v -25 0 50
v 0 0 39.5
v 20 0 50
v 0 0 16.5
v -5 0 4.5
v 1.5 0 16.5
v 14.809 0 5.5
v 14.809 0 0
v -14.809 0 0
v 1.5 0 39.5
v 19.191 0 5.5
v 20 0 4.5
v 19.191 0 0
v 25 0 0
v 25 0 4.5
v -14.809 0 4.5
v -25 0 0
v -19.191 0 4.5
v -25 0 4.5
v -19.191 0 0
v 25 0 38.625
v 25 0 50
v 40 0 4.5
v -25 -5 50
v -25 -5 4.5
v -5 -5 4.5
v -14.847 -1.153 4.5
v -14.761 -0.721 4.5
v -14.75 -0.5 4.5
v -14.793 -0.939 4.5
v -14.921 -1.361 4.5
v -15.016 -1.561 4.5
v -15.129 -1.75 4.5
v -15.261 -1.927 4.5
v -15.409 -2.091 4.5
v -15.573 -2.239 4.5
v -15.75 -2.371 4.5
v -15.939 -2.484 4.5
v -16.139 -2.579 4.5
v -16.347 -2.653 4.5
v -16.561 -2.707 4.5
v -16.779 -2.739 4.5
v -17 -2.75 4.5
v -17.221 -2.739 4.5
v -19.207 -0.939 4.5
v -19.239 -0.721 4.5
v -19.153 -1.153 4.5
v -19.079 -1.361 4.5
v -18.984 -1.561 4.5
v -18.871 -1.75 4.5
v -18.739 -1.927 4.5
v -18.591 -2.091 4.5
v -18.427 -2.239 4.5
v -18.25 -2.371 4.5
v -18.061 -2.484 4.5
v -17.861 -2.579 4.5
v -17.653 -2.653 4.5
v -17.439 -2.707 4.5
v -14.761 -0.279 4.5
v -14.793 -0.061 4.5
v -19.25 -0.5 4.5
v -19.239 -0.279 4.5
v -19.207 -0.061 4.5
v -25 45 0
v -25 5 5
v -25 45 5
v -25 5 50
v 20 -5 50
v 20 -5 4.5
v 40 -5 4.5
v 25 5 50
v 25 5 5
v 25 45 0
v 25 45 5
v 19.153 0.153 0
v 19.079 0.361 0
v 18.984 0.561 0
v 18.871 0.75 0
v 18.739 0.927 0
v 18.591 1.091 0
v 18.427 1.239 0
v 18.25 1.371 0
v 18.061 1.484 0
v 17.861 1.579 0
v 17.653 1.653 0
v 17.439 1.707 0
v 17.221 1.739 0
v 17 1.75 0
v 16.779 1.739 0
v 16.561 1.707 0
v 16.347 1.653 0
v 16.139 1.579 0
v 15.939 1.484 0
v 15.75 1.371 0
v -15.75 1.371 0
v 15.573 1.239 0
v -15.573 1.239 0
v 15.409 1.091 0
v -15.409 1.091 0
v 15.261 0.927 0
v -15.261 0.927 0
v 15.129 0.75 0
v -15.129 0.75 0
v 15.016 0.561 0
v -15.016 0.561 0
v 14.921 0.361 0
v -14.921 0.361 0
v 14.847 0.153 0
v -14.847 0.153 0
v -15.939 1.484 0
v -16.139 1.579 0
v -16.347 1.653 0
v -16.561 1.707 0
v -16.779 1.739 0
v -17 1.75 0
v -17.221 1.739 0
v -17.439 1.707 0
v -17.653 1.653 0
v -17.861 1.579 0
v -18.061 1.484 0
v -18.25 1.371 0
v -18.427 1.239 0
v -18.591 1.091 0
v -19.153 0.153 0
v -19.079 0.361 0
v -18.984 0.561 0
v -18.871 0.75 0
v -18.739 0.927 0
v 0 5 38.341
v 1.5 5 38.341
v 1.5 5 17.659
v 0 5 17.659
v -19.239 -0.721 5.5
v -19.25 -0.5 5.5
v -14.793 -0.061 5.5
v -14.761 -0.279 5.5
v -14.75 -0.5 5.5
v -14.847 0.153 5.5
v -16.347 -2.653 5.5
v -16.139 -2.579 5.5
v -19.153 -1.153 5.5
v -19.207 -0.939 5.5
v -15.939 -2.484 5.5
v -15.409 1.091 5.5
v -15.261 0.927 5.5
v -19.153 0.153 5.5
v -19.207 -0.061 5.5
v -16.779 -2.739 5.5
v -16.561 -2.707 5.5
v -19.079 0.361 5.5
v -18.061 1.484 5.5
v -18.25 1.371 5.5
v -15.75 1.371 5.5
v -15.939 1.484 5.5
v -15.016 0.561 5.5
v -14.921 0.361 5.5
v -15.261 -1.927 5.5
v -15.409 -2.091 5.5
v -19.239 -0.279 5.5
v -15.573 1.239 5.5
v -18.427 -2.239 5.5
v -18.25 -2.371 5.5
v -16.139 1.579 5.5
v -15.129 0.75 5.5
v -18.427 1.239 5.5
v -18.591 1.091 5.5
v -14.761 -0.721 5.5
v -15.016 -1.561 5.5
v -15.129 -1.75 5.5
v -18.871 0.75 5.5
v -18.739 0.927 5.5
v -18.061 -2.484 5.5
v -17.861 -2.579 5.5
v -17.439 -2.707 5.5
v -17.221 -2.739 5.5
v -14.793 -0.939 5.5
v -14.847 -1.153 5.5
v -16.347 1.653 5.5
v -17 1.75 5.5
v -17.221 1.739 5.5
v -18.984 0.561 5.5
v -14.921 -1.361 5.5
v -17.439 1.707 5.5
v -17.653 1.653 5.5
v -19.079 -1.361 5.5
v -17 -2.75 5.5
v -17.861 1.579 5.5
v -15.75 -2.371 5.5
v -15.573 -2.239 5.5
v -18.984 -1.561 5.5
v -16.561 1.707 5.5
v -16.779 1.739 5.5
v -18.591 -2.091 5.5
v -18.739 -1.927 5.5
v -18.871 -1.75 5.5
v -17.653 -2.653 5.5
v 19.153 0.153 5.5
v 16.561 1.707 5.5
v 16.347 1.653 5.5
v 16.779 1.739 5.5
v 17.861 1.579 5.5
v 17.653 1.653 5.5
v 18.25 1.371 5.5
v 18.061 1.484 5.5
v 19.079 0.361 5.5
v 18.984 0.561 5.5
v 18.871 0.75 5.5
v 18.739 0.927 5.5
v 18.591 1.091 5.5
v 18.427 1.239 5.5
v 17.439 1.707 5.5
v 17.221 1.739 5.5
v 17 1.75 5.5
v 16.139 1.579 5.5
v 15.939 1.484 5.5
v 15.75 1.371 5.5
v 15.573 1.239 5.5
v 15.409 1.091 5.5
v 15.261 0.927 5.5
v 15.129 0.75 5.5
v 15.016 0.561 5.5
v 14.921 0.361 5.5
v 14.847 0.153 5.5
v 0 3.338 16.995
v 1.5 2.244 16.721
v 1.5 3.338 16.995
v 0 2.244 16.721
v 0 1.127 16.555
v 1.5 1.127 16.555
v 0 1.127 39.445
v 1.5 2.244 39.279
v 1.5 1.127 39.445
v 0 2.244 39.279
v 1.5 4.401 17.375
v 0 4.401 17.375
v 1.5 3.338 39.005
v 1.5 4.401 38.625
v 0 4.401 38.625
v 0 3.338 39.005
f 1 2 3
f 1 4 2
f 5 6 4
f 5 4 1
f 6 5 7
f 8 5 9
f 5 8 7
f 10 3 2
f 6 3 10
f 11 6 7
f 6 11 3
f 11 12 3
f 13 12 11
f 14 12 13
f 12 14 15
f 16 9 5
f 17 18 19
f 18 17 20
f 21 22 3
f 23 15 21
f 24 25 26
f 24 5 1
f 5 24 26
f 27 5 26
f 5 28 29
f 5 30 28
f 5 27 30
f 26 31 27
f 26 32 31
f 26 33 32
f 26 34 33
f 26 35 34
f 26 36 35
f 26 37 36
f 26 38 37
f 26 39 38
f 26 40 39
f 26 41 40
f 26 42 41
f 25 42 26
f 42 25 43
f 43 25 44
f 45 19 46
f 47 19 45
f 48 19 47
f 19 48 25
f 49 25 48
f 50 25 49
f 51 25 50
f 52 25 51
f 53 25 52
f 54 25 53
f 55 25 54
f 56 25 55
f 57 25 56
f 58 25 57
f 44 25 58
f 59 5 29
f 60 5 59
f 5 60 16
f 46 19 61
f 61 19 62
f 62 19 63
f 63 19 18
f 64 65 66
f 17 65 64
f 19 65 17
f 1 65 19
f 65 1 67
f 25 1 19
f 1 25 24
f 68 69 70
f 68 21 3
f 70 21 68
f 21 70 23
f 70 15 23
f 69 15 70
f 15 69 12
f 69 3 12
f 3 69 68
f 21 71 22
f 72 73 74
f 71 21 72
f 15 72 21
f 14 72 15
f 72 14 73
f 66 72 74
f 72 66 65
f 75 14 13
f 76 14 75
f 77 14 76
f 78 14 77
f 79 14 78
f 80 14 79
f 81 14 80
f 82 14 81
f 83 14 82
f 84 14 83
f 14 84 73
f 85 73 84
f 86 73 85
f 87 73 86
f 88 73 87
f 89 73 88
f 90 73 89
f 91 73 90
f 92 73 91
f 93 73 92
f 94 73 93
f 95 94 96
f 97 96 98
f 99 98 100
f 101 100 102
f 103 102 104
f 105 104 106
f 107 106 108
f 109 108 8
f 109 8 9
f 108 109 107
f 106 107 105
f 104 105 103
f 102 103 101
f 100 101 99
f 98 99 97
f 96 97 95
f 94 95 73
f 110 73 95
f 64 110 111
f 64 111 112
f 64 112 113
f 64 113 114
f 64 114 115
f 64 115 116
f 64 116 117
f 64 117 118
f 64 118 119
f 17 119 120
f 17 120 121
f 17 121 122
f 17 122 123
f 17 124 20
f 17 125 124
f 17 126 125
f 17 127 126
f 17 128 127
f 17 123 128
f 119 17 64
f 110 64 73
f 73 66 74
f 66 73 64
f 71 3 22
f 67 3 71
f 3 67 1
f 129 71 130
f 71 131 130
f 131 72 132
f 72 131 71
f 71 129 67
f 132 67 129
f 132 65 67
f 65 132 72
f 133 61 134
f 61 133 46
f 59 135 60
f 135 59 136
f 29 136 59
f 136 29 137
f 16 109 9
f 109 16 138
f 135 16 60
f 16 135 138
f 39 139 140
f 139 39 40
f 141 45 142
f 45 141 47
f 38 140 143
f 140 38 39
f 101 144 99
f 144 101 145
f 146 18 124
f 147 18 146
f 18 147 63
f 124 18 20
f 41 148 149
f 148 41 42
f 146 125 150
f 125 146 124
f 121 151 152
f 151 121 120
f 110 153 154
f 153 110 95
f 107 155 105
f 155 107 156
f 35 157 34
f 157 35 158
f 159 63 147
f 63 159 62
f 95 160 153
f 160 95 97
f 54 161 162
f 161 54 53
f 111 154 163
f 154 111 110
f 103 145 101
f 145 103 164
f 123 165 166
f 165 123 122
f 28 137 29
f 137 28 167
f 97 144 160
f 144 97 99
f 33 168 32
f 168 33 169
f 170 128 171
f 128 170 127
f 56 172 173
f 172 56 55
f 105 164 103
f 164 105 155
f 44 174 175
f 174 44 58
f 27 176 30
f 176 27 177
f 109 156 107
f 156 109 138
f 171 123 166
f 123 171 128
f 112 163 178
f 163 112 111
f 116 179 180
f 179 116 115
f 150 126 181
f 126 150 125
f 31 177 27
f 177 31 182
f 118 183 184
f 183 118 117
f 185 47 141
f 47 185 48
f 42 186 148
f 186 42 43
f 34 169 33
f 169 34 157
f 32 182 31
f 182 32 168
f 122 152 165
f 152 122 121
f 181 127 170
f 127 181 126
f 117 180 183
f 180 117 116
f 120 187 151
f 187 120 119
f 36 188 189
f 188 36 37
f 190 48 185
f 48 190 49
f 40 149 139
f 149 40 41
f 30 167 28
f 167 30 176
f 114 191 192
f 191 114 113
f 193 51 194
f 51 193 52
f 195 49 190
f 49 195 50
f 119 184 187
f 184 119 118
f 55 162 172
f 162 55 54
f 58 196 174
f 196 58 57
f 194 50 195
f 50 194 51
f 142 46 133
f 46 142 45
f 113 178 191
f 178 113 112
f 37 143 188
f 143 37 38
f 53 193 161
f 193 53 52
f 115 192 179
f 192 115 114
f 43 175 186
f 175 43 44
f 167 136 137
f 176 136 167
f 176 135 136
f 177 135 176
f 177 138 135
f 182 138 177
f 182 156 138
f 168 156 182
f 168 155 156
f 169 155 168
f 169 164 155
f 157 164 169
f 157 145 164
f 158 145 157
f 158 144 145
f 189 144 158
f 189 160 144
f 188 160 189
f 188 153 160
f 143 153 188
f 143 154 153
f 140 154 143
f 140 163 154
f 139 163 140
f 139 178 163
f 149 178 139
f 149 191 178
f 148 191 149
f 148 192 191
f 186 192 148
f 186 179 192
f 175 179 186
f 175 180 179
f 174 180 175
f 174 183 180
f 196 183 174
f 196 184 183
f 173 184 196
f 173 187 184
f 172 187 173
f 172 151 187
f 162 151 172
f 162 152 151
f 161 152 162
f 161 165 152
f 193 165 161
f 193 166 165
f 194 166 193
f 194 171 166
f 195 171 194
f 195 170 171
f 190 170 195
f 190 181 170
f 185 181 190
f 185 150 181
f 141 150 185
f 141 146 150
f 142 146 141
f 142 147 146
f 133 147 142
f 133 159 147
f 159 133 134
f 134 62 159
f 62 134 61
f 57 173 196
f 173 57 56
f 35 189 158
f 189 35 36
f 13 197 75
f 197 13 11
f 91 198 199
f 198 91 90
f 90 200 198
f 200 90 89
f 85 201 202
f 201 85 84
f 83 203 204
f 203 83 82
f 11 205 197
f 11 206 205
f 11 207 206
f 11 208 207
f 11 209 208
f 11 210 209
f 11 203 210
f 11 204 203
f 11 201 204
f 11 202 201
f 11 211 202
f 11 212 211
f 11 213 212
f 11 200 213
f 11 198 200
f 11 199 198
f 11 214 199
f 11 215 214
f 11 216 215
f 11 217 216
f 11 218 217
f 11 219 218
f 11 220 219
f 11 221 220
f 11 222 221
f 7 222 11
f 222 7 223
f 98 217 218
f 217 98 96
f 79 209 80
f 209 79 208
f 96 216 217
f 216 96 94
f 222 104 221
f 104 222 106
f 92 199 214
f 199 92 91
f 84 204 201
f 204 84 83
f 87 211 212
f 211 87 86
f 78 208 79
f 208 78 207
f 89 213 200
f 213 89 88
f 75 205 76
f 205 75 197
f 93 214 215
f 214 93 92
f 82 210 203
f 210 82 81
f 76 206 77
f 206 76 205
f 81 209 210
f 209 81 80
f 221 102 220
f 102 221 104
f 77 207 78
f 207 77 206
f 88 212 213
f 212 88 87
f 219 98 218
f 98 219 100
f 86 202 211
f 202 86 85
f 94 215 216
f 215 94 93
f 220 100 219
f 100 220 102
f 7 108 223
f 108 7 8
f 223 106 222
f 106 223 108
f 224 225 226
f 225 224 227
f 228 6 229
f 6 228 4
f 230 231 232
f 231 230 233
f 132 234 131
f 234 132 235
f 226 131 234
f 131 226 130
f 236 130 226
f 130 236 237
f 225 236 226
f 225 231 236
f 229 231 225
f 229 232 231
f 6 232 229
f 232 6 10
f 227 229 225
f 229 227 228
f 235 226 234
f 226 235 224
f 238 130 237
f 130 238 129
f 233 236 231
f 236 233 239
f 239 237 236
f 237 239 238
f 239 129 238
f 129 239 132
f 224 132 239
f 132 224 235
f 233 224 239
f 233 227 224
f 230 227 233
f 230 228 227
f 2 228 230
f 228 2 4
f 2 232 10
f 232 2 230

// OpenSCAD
// L-shaped mounting bracket for NEMA 17 stepper motor (e.g. syringe pump)
// Print orientation: base plate on bed (z = 0), motor plate builds upward.

$fn = 64;

// ---- Base plate ----
base_x0 = -25;      // plate x start
base_x1 = 25;       // plate x end
base_y0 = 0;        // plate y start
base_y1 = 45;       // plate y end
base_t  = 5;        // plate thickness (z)

// ---- Motor plate ----
motor_x0 = -25;     // plate x start
motor_x1 = 25;      // plate x end
motor_y0 = 0;       // plate y start
motor_y1 = 5;       // plate y end (on back edge of base)
motor_h  = 50;      // plate height (z)

// ---- Boss hole ----
boss_d     = 23;    // motor centring boss hole diameter
boss_x     = 0;     // hole centre x
boss_z     = 28;    // hole centre z
boss_h     = 1;     // cutter overshoot past top face

// ---- Screw holes ----
screw_d     = 3.4;  // M3 screw hole diameter
screw_pitch = 31;   // square pattern side length
screw_n     = 4;    // number of holes
screw_z     = 28;   // hole depth from top face

// ---- Gussets ----
gusset_t     = 5;   // gusset thickness (x)
gusset_leg   = 20;  // right triangle leg lengths (Y and Z)
gusset_x0    = -25; // left gusset x start
gusset_x1    = -20; // left gusset x end
gusset_x2    = 20;  // right gusset x start
gusset_x3    = 25;  // right gusset x end

// ---- Misc ----
eps = 0.5;          // cutter overshoot for through-holes

difference() {
    union() {
        // Base plate
        translate([base_x0, base_y0, 0])
            cube([base_x1 - base_x0, base_y1 - base_y0, base_t]);

        // Motor plate
        translate([motor_x0, motor_y0, 0])
            cube([motor_x1 - motor_x0, motor_y1 - motor_y0, motor_h]);

        // Gussets (right triangle in YZ plane, flush with edges)
        for (sx = [-1, 1])
            translate([sx > 0 ? gusset_x2 : gusset_x0, 0, 0])
                rotate([90, 0, 0])
                    linear_extrude(height = gusset_t)
                        polygon([
                            [gusset_leg, base_t - eps],   // bottom right (slightly inside base)
                            [0, base_t - eps],            // bottom left
                            [0, motor_h]                   // top left
                        ]);
    }

    // Base plate through-holes (M4)
    for (hx = [-17, 17])
        translate([hx, base_y0 - eps, -eps])
            cylinder(d = 4.5, h = base_t + 2 * eps);

    // Boss hole for motor centring boss
    translate([boss_x, 0, boss_z])
        rotate([0, 90, 0])
            cylinder(d = boss_d, h = boss_h + eps);

    // M3 screw holes on square pattern, centred on boss hole
    for (i = [0 : screw_n - 1]) {
        x = (i - (screw_n - 1) / 2) * screw_pitch;
        y = (i % 2 - (screw_n - 1) / 2) * screw_pitch;
        translate([x, y, motor_y1 - screw_z])
            cylinder(d = screw_d, h = screw_z + eps);
    }
}
